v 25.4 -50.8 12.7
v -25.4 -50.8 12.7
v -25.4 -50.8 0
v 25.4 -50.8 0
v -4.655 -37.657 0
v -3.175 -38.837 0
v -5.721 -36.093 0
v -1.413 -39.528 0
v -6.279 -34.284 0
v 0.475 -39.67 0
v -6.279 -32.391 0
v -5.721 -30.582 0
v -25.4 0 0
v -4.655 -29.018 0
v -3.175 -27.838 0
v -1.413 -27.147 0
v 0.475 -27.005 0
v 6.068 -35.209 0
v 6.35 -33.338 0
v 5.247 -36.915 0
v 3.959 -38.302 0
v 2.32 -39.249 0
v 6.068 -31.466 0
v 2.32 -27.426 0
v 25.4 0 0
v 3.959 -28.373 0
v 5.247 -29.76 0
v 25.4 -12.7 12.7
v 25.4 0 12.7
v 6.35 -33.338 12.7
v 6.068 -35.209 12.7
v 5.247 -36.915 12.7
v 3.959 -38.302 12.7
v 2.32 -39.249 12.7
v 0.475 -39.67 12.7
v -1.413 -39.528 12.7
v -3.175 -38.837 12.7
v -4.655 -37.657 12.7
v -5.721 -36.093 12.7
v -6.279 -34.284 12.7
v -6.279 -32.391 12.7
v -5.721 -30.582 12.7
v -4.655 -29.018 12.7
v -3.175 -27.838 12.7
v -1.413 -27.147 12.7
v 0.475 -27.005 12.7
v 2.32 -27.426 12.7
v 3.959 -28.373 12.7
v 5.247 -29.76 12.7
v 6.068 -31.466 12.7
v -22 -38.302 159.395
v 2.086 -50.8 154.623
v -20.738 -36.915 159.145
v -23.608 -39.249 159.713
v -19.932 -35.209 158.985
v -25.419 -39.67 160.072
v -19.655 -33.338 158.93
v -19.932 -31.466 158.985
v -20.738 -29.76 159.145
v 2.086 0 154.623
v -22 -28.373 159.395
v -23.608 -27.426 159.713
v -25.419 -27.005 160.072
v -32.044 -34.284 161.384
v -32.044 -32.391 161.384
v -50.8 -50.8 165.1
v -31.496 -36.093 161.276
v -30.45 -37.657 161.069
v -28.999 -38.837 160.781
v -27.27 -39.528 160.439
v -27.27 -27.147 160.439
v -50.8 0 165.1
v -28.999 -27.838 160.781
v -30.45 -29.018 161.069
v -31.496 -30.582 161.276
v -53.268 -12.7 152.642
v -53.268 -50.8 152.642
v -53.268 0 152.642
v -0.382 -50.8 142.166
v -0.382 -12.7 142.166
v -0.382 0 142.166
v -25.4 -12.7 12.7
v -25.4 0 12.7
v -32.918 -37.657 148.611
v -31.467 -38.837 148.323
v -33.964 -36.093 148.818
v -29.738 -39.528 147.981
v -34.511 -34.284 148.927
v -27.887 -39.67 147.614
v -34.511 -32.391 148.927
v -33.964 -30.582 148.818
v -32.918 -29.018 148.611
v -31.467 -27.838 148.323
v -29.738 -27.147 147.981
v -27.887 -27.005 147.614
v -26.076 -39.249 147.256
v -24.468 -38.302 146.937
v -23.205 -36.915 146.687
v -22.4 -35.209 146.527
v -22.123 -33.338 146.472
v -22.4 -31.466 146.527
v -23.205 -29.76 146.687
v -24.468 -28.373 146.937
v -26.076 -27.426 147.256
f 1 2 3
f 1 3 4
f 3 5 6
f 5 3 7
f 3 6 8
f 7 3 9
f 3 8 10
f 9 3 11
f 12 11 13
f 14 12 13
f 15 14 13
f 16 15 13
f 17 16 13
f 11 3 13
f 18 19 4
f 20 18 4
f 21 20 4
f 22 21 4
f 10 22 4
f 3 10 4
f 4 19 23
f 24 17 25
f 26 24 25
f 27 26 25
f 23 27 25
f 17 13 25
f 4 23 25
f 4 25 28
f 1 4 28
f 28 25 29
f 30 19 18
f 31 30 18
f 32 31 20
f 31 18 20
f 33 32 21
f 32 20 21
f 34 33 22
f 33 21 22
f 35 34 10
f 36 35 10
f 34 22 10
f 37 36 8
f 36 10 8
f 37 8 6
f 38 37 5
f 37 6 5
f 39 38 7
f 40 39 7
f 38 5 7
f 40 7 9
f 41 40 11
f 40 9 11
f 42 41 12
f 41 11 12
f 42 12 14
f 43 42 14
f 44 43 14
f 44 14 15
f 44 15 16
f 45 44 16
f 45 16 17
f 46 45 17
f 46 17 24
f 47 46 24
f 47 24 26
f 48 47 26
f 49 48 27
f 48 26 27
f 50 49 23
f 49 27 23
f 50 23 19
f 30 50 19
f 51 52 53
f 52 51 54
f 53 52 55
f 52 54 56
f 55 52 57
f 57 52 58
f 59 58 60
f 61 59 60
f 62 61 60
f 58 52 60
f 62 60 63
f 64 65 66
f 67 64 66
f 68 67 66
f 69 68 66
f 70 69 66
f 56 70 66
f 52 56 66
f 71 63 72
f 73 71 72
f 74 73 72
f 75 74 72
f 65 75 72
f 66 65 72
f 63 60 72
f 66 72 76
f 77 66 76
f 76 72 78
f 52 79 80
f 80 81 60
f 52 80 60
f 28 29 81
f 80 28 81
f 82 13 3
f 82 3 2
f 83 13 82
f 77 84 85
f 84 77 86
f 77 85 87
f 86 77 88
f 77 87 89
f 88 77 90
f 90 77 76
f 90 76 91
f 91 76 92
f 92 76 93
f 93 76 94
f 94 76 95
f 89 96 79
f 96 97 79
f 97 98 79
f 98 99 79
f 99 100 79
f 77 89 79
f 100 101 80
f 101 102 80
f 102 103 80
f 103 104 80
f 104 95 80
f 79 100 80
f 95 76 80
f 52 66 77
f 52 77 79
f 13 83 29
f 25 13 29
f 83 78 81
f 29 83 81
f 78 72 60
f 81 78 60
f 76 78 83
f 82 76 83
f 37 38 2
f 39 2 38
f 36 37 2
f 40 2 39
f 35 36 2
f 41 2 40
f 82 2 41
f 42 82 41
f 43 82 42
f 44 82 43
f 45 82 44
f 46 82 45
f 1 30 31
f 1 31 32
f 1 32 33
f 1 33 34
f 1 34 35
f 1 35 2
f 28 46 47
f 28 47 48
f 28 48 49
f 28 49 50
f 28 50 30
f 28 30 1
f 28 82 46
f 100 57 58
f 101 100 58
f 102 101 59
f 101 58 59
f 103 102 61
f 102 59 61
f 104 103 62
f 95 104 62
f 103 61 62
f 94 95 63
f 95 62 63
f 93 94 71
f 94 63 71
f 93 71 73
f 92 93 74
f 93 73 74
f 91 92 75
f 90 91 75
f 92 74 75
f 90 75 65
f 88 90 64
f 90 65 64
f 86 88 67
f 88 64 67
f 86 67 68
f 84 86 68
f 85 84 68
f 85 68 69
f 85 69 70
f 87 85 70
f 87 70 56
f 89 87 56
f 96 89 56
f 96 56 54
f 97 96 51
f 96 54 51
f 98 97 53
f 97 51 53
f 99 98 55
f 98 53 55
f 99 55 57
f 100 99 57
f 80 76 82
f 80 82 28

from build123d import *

# Parameters (mm, degrees)
F0_W     = 50.8
F0_H     = 12.7
F1_DEPTH = 50.8
F2_DEPTH = 12.7
F3_R     = 6.35
F4_DEPTH = 12.7
F5_R     = 6.35
F6_DEPTH = 12.7


with BuildPart() as f1:
    # F0 (on Front) → F1 (new body)
    with BuildSketch(Plane.XZ):
        with Locations((0, 6.35)):
            Rectangle(F0_W, F0_H)
    extrude(amount=F1_DEPTH)



with BuildPart() as f1b:
    # F0 (on Front) → F1, piece 2 (new body)
    with BuildSketch(Plane.XZ):
        Polygon((-50.8, 165.1), (-53.2678634281, 152.6420848413), (-0.3815758649, 142.1655216876), (2.0862875631, 154.6234368462), align=None)
    extrude(amount=F1_DEPTH)


with BuildPart() as f1_1:
    add(f1.part)

    add(f1b.part)  # F2 merges F1b
    # F0 (on Front) → F2 (join)
    with BuildSketch(Plane.XZ):
        Polygon((-53.2678634281, 152.6420848413), (-25.4, 12.7), (25.4, 12.7), (-0.3815758649, 142.1655216876), align=None)
    extrude(amount=F2_DEPTH)

    # F3 (on face) → F4 (cut, through all)
    with BuildSketch(Plane(origin=(0, 0, 0), x_dir=(1, 0, 0), z_dir=(0, 0, -1))):
        with Locations((0, 33.3375)):
            Circle(F3_R)
    extrude(amount=-F4_DEPTH, mode=Mode.SUBTRACT)

    # F5 (on face) → F6 (cut, through all)
    with BuildSketch(Plane(origin=(29.5524592231, 0, 149.1824975169), x_dir=(0.9809382015, 0, -0.194319955), z_dir=(0.194319955, 0, 0.9809382015))):
        with Locations((-56.5138851996, -33.3375)):
            Circle(F5_R)
    extrude(amount=-F6_DEPTH, mode=Mode.SUBTRACT)


solid = f1_1.part
